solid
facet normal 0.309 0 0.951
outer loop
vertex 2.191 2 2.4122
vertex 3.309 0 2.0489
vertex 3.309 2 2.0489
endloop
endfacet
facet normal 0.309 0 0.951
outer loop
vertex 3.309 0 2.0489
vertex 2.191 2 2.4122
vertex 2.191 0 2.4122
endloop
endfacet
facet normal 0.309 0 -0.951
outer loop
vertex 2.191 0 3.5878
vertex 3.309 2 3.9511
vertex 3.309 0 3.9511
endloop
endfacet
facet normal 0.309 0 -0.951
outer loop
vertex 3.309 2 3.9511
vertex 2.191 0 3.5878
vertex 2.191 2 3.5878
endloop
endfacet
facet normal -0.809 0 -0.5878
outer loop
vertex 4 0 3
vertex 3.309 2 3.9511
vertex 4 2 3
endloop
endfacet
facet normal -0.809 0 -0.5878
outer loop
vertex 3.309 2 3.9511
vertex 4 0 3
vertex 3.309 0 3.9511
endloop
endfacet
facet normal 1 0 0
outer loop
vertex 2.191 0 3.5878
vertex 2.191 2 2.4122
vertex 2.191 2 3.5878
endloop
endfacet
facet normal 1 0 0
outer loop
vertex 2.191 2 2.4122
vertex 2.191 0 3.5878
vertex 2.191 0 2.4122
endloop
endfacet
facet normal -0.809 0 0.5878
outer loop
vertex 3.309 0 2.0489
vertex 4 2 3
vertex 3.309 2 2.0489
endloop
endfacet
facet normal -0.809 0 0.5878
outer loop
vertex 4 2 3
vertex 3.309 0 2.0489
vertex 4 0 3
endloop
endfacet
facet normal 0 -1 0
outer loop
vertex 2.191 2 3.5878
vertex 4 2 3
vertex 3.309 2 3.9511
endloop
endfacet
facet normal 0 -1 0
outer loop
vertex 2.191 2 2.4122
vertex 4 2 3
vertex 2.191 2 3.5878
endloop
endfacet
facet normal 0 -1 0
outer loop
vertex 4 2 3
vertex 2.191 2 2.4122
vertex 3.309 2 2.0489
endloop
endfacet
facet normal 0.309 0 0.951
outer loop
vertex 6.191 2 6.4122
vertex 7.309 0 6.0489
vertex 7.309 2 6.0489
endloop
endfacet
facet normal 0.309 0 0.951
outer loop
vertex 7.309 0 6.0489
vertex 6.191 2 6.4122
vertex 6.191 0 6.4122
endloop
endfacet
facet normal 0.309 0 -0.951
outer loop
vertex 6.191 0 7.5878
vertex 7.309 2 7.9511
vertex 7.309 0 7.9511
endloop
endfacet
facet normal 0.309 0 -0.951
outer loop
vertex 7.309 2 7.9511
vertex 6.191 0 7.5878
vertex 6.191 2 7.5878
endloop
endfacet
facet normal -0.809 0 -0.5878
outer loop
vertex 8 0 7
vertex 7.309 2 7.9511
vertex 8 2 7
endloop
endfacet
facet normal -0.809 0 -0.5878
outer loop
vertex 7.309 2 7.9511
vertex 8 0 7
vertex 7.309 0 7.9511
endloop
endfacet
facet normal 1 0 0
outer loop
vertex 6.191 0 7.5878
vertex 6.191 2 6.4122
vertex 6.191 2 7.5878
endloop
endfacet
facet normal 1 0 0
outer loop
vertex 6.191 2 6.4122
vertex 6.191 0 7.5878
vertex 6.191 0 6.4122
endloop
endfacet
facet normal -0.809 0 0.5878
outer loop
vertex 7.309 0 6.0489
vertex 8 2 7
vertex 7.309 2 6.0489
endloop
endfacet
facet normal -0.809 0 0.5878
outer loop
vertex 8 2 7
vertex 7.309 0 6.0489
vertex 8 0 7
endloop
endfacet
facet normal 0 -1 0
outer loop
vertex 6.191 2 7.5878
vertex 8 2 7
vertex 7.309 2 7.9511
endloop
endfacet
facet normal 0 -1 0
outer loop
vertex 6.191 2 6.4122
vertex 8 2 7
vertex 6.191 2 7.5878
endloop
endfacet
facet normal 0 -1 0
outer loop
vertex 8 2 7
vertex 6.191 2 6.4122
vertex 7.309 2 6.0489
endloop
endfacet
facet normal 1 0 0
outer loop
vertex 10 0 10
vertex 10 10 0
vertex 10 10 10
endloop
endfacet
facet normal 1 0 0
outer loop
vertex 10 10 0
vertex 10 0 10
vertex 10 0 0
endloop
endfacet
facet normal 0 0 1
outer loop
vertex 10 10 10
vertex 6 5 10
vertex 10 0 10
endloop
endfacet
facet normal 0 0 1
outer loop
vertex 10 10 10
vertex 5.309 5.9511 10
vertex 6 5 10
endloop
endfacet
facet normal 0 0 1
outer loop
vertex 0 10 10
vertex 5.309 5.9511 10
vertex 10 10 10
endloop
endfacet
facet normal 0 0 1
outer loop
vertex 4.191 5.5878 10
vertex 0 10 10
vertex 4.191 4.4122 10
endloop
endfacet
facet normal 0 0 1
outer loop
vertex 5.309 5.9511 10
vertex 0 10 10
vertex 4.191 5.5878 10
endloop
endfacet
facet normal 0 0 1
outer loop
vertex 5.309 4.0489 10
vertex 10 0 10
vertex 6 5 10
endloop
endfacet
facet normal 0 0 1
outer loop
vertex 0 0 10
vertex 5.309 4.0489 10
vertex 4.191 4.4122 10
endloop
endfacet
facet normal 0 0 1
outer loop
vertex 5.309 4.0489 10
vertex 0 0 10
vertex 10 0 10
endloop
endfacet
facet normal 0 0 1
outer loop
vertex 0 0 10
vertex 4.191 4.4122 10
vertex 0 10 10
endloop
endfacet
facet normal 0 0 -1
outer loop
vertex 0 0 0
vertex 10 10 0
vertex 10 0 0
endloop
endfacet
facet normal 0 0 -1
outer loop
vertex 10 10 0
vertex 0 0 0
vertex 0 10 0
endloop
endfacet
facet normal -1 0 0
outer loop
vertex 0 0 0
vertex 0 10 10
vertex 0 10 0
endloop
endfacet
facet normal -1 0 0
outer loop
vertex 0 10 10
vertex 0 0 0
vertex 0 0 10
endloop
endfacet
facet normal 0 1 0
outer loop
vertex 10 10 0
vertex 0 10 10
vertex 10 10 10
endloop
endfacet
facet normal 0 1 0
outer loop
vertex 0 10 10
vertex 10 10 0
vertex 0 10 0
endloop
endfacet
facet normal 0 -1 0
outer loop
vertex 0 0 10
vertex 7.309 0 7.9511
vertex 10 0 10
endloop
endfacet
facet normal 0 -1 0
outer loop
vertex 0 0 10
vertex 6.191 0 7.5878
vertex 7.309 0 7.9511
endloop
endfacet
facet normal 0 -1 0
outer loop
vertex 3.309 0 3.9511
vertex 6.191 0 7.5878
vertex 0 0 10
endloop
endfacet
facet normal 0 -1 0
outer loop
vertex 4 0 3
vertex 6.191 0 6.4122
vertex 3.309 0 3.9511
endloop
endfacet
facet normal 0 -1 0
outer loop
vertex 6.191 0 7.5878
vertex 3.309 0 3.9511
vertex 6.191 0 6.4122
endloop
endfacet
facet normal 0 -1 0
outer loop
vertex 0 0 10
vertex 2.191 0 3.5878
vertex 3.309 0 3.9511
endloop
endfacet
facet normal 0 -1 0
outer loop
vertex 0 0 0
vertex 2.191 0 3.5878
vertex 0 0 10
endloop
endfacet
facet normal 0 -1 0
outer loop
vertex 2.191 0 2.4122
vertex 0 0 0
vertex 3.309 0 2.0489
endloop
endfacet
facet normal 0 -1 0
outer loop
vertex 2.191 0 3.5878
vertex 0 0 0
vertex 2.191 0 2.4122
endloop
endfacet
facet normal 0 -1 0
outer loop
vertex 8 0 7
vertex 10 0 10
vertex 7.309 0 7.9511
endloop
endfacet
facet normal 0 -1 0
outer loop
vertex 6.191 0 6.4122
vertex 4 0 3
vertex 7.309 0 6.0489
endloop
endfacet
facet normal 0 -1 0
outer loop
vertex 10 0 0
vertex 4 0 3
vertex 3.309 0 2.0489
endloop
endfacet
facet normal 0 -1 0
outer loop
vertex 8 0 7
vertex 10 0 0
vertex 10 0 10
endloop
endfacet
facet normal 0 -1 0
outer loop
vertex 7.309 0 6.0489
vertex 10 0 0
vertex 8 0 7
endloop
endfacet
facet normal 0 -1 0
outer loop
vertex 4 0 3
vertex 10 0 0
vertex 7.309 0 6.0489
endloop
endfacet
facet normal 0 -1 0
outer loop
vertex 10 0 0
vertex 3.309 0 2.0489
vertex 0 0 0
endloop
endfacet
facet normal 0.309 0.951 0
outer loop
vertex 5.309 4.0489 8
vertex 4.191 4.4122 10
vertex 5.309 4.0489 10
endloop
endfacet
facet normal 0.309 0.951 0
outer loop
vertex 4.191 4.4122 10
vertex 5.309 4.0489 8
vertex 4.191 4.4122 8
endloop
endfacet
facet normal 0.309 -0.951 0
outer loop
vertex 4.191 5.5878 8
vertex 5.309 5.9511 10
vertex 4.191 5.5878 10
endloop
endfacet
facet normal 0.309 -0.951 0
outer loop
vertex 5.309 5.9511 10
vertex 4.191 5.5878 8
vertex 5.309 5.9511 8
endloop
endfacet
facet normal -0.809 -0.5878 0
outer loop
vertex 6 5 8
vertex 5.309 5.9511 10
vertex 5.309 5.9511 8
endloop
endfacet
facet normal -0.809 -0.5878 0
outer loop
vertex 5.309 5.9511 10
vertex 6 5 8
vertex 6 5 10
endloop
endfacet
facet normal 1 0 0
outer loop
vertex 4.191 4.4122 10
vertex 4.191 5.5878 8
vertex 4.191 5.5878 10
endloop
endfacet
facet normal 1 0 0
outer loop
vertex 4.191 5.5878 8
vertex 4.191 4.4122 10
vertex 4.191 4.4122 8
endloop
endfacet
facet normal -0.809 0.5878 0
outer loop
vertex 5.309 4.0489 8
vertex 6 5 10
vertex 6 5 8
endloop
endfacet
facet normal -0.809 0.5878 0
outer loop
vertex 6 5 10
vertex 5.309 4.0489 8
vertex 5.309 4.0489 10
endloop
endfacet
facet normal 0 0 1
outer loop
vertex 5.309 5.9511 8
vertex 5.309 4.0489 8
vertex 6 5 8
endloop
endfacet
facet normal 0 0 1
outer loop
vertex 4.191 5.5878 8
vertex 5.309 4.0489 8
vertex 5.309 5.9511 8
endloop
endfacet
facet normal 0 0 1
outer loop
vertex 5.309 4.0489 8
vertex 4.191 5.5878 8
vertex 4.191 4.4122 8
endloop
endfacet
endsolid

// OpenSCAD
// file: local.scad
//a few utility functions
function norm(a) = sqrt(a*a);
function unit_vector(v) = v/norm(v);
function clamp(v,lower_bound,upper_bound) = min(max(v,lower_bound),upper_bound);
function cross_product(a,b) = [
	a[1]*b[2]-a[2]*b[1],
	a[2]*b[0]-a[0]*b[2],
	a[0]*b[1]-a[1]*b[0]
];

//works for both numbers and vectors
function almost_equal(number, ref, tol) = sqrt((number-ref)*(number-ref)) < tol;

function _rotation_angle(a,b) = (a*b > 0) ? 
	asin(clamp(norm(cross_product(b,a))/norm(a)/norm(b),-1,1)) :
	180 - asin(clamp(norm(cross_product(b,a))/norm(a)/norm(b),-1,1));

//The (non-unit) rotation axis and angle around which a has to be rotated to be colinear to b
function calculate_rotation_axis(a,b) =
	//if the two vectors are not colinear find a rotation axis using the cross product
	(norm(cross_product(b,a)) != 0) ? [unit_vector(cross_product(b,a)),_rotation_angle(a,b)] :
	//if they are colinear and do not lie in the yz plane, choose the rotation axis from the yz plane
	(a*[1,0,0] < 0) ? [unit_vector([0,-a[1],+a[0]]),acos(clamp(a*b/norm(a)/norm(b),-1,1))] :
	(a*[1,0,0] > 0) ? [unit_vector([0,+a[1],-a[0]]),acos(clamp(a*b/norm(a)/norm(b),-1,1))] :
	//otherwise use the x axis
	[[1,0,0],acos(clamp(a*b/norm(a)/norm(b),-1,1))];

function calculate_axes(x,y) = [unit_vector(x),unit_vector(y), unit_vector(cross_product(x,y))];

function new_cs(origin=[0,0,0],axes=[[1,0,0],[0,1,0],[0,0,1]]) = (len(axes) == 2) ?
	[origin,calculate_axes(axes[0],axes[1])] :
	is_orthonormal([origin,axes]) ?
		[origin,axes] :
		"Error: Axes are not orthonormal";

function is_orthonormal(cs,tol=1e-3) =
	(almost_equal(norm(cs[1][0]),1,tol)) &&
	(almost_equal(norm(cs[1][1]),1,tol)) &&
	(almost_equal(norm(cs[1][2]),1,tol)) &&
	(almost_equal(cross_product(cs[1][0],cs[1][1]),cs[1][2],tol)) &&
	(almost_equal(cross_product(cs[1][1],cs[1][2]),cs[1][0],tol)) &&
	(almost_equal(cross_product(cs[1][2],cs[1][0]),cs[1][1],tol));

function unit_matrix3() = [
[1,0,0],
[0,1,0],
[0,0,1]];

function tensor_product_matrix3(u,v) = [
[u[0]*v[0], u[0]*v[1], u[0]*v[2]],
[u[1]*v[0], u[1]*v[1], u[1]*v[2]],
[u[2]*v[0], u[2]*v[1], u[2]*v[2]]];

function cross_product_matrix3(v) = [
[   0 , -v[2], +v[1]],
[+v[2],    0 , -v[0]],
[-v[1],  v[0],    0 ]];

function rotation_matrix3(n,angle) =
	cos(angle)*unit_matrix3() +
	sin(angle)*cross_product_matrix3(n) +
	(1-cos(angle))*tensor_product_matrix3(n,n);

//the modules are used directly by the user
module show_cs(cs){
	origin = cs[0];
	axes = cs[1];
	x_rot = calculate_rotation_axis(axes[0],[0,0,1]);
	y_rot = calculate_rotation_axis(axes[1],[0,0,1]);
	z_rot = calculate_rotation_axis(axes[2],[0,0,1]);
	translate(origin){
		color("Gray") sphere(0.2);
		rotate(x_rot[1],x_rot[0]) color("Red") cylinder(r=0.1,h=norm(axes[0]));
		rotate(y_rot[1],y_rot[0]) color("Green") cylinder(r=0.1,h=norm(axes[1]));
		rotate(z_rot[1],z_rot[0]) color("Blue") cylinder(r=0.1,h=norm(axes[2]));
	}
}

module translate_local(cs,v=[0,0,0]){
	origin = cs[0];
	axes = cs[1];
	x_rot = calculate_rotation_axis(axes[0],[1,0,0]);
	y_rot = calculate_rotation_axis(axes[1],
		rotation_matrix3(x_rot[0],x_rot[1])*[0,1,0]);
	translate(origin+v*axes){
		//align y axes
		rotate(y_rot[1],y_rot[0]){
			//align x axes
			rotate(x_rot[1],x_rot[0]){
				child(0);
			}
		}
	}
}

module in_cs(cs){
	origin = cs[0];
	axes = cs[1];
	x_rot = calculate_rotation_axis(axes[0],[1,0,0]);
	y_rot = calculate_rotation_axis(axes[1],
		rotation_matrix3(x_rot[0],x_rot[1])*[0,1,0]);
	translate(origin){
		//align y axes
		rotate(y_rot[1],y_rot[0]){
			//align x axes
			rotate(x_rot[1],x_rot[0]){
				child(0);
			}
		}
	}
}

module align(cs, cs_dst, displacement){
	x_rot = calculate_rotation_axis(cs[1][0],cs_dst[1][0]);
	y_rot = _rotation_angle(cs[1][1],
		rotation_matrix3(x_rot[0],x_rot[1])*cs_dst[1][1]);
	echo(y_rot);
	translate(cs_dst[0])
		//align y axes
		rotate(-y_rot,cs[1][0])
			//align x axes
			rotate(x_rot[1],x_rot[0])
				translate(-cs[0]+displacement)
					child(0);
}
// main file
//coordinate systems make code nice and clean
//coordinate systems can be put on surfaces to make positioning of things easy
//this helps to avoid difficult expressions like translate([magic_number + 10 - h + l,k - 3*b,50])
//even more helpful if faces are not parallel to coordinate axes

use <local.scad>

c1 = new_cs(origin=[0,0,10]);
c2 = new_cs(axes=[[1,0,0],[0,0,1]]);

difference(){
	cube(10,10,10);
	translate_local(c1,[5,5,-2]) cylinder(r=1,h=3);
	in_cs(c2) union(){
		translate([3,3,-2]) cylinder(r=1,h=3);
		translate([7,7,-2]) cylinder(r=1,h=3);
	}
}
